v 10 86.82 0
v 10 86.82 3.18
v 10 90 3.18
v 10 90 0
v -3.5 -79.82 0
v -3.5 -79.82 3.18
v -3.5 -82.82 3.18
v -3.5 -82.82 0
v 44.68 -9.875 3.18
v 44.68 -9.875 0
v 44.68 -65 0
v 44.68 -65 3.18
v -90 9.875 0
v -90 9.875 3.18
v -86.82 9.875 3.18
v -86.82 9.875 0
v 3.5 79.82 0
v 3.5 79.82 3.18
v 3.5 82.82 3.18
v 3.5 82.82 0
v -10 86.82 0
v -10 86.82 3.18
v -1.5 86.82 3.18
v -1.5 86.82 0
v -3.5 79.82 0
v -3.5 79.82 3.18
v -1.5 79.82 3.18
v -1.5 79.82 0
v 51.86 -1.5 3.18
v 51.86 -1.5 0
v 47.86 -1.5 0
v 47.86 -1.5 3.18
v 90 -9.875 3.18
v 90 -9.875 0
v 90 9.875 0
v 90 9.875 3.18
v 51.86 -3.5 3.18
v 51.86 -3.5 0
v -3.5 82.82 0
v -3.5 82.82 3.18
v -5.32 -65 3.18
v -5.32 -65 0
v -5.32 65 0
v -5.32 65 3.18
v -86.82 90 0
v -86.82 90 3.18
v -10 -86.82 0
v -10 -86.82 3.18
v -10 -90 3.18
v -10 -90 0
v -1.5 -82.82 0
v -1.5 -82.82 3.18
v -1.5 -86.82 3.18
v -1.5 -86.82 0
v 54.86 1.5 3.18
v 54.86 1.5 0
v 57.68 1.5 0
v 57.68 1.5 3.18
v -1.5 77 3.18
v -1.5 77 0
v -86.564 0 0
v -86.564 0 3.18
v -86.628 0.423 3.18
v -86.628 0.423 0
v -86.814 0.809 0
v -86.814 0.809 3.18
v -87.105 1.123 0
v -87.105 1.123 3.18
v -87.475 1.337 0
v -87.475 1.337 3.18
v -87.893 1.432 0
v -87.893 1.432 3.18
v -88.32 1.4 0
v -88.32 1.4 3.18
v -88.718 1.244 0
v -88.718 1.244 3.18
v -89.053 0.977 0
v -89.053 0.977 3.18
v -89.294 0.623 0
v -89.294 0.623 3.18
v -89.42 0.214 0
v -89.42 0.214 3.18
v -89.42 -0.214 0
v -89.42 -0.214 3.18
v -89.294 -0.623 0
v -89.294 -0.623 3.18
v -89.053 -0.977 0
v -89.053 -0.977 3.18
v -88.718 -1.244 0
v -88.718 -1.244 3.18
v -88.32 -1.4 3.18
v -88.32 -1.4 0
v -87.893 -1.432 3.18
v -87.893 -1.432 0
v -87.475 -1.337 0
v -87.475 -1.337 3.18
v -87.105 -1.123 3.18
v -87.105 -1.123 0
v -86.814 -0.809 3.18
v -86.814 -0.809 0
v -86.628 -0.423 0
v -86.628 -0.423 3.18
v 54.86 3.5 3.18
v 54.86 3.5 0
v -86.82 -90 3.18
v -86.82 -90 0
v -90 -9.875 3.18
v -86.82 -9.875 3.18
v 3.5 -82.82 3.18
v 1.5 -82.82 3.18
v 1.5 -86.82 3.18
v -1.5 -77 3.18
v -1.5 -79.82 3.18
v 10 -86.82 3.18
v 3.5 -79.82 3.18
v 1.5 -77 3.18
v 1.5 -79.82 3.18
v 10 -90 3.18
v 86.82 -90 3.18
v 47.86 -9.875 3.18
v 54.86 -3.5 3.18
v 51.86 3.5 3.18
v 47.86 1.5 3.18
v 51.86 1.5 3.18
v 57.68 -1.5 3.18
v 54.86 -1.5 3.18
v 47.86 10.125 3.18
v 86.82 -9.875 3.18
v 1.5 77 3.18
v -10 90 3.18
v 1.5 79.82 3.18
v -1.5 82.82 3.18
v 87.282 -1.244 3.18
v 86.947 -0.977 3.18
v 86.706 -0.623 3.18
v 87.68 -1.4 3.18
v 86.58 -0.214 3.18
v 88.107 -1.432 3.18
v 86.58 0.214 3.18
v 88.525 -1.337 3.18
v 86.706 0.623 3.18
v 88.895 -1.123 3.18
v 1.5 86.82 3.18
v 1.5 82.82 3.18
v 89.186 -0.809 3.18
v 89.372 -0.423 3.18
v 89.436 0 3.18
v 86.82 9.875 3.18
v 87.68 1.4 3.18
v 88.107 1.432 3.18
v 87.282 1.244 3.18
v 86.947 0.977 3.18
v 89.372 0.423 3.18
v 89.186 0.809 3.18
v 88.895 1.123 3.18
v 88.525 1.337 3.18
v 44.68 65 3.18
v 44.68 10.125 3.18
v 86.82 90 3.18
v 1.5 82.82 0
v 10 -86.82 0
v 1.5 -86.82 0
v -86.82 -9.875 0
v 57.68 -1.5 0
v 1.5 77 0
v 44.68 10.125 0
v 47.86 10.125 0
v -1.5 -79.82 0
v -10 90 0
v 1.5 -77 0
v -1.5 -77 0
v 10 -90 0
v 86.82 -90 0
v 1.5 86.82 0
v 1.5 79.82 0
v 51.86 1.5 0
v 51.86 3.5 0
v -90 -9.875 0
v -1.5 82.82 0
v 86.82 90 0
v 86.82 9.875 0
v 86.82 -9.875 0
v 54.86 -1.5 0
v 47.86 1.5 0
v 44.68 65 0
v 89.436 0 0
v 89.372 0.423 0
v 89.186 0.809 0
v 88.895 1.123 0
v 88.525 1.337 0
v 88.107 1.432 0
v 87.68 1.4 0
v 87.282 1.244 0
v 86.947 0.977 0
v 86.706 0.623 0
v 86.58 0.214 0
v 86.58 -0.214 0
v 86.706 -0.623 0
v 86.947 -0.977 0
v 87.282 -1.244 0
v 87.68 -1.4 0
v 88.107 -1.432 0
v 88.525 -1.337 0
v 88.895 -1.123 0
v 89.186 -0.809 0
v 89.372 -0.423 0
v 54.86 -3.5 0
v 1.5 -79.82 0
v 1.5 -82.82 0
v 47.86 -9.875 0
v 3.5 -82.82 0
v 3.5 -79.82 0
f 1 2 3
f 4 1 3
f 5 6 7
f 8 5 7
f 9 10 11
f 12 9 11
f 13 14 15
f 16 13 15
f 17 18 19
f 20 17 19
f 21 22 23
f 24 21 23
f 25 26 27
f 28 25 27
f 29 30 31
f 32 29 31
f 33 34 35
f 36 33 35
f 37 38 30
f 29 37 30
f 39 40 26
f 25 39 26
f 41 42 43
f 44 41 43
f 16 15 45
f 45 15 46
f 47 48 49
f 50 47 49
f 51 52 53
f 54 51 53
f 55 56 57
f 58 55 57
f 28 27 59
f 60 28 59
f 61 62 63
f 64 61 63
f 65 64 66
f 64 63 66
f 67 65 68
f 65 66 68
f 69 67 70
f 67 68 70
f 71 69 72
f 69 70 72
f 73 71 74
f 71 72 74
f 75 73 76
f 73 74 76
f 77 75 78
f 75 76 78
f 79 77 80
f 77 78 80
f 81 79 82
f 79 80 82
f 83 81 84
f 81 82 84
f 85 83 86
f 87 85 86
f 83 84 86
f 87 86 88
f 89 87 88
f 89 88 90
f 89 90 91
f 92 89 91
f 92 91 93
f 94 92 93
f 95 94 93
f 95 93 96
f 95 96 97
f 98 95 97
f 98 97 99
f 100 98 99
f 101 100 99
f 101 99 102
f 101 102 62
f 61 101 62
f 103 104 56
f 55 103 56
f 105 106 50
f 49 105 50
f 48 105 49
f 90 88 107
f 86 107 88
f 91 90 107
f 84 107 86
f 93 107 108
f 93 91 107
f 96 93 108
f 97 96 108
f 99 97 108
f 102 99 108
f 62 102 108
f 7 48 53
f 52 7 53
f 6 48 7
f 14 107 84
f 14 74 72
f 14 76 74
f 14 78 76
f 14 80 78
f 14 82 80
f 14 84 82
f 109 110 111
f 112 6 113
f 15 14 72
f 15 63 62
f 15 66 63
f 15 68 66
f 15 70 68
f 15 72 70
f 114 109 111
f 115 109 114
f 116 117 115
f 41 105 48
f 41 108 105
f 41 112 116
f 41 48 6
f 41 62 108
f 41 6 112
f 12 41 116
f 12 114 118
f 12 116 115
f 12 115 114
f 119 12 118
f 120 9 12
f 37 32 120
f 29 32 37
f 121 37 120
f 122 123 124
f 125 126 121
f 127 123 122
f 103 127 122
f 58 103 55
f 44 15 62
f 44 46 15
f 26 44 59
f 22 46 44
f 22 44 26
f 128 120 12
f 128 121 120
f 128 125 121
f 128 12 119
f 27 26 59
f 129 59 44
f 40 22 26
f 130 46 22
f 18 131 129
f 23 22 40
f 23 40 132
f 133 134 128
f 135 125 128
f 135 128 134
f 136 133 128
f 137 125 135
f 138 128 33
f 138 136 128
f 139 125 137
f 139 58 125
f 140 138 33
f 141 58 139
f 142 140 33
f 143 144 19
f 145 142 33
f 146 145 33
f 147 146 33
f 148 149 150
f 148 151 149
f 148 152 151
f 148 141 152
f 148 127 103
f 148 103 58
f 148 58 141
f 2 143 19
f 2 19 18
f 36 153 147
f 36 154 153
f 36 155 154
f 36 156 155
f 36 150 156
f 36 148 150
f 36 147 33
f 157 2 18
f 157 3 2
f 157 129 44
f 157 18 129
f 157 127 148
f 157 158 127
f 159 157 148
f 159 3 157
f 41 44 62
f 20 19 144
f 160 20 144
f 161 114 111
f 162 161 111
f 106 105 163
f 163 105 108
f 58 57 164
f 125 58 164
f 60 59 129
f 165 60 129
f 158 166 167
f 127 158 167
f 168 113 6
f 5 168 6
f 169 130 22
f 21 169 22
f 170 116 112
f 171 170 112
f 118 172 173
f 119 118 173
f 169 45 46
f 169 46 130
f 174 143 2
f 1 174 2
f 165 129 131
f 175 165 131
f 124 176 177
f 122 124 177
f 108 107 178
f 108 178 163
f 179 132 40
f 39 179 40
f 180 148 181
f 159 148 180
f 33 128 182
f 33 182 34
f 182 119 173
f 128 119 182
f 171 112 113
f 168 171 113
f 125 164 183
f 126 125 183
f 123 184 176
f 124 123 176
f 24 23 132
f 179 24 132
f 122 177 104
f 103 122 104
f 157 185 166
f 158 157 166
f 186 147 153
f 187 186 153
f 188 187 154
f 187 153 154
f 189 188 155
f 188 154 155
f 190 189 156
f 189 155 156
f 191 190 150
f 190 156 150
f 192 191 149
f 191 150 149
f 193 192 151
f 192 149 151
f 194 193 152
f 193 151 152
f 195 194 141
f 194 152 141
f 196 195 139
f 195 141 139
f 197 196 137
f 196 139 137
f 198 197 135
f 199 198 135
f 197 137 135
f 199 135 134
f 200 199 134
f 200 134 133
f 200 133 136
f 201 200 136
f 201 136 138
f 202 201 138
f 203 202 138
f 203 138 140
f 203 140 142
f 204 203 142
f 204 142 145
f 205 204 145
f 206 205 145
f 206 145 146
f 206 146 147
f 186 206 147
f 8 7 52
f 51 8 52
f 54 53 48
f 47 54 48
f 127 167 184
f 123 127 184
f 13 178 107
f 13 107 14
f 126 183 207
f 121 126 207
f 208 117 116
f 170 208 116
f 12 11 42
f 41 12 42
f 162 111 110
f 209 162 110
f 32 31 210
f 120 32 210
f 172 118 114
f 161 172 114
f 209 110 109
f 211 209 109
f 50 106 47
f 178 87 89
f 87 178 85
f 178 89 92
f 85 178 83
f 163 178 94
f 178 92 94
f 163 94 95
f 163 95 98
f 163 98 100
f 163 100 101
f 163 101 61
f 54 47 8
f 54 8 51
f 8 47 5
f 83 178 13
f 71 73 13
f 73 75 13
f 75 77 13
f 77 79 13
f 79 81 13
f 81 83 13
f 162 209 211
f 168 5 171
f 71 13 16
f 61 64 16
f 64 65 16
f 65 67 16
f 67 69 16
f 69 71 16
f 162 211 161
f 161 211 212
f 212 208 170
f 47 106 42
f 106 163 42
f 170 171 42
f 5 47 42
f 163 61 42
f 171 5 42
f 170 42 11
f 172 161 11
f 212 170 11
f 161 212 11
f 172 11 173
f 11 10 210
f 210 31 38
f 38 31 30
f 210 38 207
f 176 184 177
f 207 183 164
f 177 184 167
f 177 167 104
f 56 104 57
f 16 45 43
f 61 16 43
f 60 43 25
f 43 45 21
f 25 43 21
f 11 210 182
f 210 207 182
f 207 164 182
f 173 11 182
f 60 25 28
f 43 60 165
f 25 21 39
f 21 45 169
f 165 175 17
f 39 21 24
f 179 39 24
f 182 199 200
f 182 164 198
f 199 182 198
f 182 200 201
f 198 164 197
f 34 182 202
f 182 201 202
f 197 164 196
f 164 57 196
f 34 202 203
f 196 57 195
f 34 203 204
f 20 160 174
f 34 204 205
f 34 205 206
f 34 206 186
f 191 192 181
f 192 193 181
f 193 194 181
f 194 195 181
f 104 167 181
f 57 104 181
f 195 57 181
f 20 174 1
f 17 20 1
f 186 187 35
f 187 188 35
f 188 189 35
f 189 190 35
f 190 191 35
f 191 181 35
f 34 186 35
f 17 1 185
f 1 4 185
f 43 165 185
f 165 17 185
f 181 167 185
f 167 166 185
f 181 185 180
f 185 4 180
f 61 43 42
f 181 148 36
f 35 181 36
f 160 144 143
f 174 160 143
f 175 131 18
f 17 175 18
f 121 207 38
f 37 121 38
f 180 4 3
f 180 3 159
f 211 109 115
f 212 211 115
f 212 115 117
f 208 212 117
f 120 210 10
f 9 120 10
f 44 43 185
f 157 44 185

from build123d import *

# Parameters (mm, degrees)
SKETCH3_W           = 180
SKETCH3_H           = 180
BOSS_EXTRUDE1_DEPTH = 3.18
CUT_EXTRUDE1_DEPTH  = 128.318939675
SKETCH5_R           = 1.436023081
SKETCH5_W           = 3.18
SKETCH5_H           = 80.125
CUT_EXTRUDE2_DEPTH  = 128.318939675


with BuildPart() as part:
    # Sketch3 → Boss-Extrude1 (new body)
    with BuildSketch(Plane.XY):
        Rectangle(SKETCH3_W, SKETCH3_H)
        Polygon((44.679729843, -65), (-5.320270157, -65), (-5.320270157, 65), (44.679729843, 65), (44.679729843, 10.125), (47.859729843, 10.125), (47.859729843, 1.5), (51.859729843, 1.5), (51.859729843, 3.5), (54.859729843, 3.5), (54.859729843, 1.5), (57.679729843, 1.5), (57.679729843, -1.5), (54.859729843, -1.5), (54.859729843, -3.5), (51.859729843, -3.5), (51.859729843, -1.5), (47.859729843, -1.5), (47.859729843, -9.875), (44.679729843, -9.875), align=None, mode=Mode.SUBTRACT)
    extrude(amount=BOSS_EXTRUDE1_DEPTH)

    # Sketch4 → Cut-Extrude1 (cut, through all)
    with BuildSketch(Plane.XY.offset(3.18)):
        Polygon((1.5, 86.82), (10, 86.82), (10, 90), (-10, 90), (-10, 86.82), (-1.5, 86.82), (-1.5, 82.82), (-3.5, 82.82), (-3.5, 79.82), (-1.5, 79.82), (-1.5, 77), (1.5, 77), (1.5, 79.82), (3.5, 79.82), (3.5, 82.82), (1.5, 82.82), align=None)
        Polygon((1.5, -79.82), (1.5, -77), (-1.5, -77), (-1.5, -79.82), (-3.5, -79.82), (-3.5, -82.82), (-1.5, -82.82), (-1.5, -86.82), (-10, -86.82), (-10, -90), (10, -90), (10, -86.82), (1.5, -86.82), (1.5, -82.82), (3.5, -82.82), (3.5, -79.82), align=None)
    extrude(amount=-CUT_EXTRUDE1_DEPTH, mode=Mode.SUBTRACT)

    # Sketch5 → Cut-Extrude2 (cut, through all)
    with BuildSketch(Plane.XY.offset(3.18)):
        with Locations((-88, 0)):
            Circle(SKETCH5_R)
        with Locations((88, 0)):
            Circle(SKETCH5_R)
        with Locations((-88.41, 49.9375)):
            Rectangle(SKETCH5_W, SKETCH5_H)
        with Locations((-88.41, -49.9375)):
            Rectangle(SKETCH5_W, SKETCH5_H)
        with Locations((88.41, -49.9375)):
            Rectangle(SKETCH5_W, SKETCH5_H)
        with Locations((88.41, 49.9375)):
            Rectangle(SKETCH5_W, SKETCH5_H)
    extrude(amount=-CUT_EXTRUDE2_DEPTH, mode=Mode.SUBTRACT)


solid = part.part
